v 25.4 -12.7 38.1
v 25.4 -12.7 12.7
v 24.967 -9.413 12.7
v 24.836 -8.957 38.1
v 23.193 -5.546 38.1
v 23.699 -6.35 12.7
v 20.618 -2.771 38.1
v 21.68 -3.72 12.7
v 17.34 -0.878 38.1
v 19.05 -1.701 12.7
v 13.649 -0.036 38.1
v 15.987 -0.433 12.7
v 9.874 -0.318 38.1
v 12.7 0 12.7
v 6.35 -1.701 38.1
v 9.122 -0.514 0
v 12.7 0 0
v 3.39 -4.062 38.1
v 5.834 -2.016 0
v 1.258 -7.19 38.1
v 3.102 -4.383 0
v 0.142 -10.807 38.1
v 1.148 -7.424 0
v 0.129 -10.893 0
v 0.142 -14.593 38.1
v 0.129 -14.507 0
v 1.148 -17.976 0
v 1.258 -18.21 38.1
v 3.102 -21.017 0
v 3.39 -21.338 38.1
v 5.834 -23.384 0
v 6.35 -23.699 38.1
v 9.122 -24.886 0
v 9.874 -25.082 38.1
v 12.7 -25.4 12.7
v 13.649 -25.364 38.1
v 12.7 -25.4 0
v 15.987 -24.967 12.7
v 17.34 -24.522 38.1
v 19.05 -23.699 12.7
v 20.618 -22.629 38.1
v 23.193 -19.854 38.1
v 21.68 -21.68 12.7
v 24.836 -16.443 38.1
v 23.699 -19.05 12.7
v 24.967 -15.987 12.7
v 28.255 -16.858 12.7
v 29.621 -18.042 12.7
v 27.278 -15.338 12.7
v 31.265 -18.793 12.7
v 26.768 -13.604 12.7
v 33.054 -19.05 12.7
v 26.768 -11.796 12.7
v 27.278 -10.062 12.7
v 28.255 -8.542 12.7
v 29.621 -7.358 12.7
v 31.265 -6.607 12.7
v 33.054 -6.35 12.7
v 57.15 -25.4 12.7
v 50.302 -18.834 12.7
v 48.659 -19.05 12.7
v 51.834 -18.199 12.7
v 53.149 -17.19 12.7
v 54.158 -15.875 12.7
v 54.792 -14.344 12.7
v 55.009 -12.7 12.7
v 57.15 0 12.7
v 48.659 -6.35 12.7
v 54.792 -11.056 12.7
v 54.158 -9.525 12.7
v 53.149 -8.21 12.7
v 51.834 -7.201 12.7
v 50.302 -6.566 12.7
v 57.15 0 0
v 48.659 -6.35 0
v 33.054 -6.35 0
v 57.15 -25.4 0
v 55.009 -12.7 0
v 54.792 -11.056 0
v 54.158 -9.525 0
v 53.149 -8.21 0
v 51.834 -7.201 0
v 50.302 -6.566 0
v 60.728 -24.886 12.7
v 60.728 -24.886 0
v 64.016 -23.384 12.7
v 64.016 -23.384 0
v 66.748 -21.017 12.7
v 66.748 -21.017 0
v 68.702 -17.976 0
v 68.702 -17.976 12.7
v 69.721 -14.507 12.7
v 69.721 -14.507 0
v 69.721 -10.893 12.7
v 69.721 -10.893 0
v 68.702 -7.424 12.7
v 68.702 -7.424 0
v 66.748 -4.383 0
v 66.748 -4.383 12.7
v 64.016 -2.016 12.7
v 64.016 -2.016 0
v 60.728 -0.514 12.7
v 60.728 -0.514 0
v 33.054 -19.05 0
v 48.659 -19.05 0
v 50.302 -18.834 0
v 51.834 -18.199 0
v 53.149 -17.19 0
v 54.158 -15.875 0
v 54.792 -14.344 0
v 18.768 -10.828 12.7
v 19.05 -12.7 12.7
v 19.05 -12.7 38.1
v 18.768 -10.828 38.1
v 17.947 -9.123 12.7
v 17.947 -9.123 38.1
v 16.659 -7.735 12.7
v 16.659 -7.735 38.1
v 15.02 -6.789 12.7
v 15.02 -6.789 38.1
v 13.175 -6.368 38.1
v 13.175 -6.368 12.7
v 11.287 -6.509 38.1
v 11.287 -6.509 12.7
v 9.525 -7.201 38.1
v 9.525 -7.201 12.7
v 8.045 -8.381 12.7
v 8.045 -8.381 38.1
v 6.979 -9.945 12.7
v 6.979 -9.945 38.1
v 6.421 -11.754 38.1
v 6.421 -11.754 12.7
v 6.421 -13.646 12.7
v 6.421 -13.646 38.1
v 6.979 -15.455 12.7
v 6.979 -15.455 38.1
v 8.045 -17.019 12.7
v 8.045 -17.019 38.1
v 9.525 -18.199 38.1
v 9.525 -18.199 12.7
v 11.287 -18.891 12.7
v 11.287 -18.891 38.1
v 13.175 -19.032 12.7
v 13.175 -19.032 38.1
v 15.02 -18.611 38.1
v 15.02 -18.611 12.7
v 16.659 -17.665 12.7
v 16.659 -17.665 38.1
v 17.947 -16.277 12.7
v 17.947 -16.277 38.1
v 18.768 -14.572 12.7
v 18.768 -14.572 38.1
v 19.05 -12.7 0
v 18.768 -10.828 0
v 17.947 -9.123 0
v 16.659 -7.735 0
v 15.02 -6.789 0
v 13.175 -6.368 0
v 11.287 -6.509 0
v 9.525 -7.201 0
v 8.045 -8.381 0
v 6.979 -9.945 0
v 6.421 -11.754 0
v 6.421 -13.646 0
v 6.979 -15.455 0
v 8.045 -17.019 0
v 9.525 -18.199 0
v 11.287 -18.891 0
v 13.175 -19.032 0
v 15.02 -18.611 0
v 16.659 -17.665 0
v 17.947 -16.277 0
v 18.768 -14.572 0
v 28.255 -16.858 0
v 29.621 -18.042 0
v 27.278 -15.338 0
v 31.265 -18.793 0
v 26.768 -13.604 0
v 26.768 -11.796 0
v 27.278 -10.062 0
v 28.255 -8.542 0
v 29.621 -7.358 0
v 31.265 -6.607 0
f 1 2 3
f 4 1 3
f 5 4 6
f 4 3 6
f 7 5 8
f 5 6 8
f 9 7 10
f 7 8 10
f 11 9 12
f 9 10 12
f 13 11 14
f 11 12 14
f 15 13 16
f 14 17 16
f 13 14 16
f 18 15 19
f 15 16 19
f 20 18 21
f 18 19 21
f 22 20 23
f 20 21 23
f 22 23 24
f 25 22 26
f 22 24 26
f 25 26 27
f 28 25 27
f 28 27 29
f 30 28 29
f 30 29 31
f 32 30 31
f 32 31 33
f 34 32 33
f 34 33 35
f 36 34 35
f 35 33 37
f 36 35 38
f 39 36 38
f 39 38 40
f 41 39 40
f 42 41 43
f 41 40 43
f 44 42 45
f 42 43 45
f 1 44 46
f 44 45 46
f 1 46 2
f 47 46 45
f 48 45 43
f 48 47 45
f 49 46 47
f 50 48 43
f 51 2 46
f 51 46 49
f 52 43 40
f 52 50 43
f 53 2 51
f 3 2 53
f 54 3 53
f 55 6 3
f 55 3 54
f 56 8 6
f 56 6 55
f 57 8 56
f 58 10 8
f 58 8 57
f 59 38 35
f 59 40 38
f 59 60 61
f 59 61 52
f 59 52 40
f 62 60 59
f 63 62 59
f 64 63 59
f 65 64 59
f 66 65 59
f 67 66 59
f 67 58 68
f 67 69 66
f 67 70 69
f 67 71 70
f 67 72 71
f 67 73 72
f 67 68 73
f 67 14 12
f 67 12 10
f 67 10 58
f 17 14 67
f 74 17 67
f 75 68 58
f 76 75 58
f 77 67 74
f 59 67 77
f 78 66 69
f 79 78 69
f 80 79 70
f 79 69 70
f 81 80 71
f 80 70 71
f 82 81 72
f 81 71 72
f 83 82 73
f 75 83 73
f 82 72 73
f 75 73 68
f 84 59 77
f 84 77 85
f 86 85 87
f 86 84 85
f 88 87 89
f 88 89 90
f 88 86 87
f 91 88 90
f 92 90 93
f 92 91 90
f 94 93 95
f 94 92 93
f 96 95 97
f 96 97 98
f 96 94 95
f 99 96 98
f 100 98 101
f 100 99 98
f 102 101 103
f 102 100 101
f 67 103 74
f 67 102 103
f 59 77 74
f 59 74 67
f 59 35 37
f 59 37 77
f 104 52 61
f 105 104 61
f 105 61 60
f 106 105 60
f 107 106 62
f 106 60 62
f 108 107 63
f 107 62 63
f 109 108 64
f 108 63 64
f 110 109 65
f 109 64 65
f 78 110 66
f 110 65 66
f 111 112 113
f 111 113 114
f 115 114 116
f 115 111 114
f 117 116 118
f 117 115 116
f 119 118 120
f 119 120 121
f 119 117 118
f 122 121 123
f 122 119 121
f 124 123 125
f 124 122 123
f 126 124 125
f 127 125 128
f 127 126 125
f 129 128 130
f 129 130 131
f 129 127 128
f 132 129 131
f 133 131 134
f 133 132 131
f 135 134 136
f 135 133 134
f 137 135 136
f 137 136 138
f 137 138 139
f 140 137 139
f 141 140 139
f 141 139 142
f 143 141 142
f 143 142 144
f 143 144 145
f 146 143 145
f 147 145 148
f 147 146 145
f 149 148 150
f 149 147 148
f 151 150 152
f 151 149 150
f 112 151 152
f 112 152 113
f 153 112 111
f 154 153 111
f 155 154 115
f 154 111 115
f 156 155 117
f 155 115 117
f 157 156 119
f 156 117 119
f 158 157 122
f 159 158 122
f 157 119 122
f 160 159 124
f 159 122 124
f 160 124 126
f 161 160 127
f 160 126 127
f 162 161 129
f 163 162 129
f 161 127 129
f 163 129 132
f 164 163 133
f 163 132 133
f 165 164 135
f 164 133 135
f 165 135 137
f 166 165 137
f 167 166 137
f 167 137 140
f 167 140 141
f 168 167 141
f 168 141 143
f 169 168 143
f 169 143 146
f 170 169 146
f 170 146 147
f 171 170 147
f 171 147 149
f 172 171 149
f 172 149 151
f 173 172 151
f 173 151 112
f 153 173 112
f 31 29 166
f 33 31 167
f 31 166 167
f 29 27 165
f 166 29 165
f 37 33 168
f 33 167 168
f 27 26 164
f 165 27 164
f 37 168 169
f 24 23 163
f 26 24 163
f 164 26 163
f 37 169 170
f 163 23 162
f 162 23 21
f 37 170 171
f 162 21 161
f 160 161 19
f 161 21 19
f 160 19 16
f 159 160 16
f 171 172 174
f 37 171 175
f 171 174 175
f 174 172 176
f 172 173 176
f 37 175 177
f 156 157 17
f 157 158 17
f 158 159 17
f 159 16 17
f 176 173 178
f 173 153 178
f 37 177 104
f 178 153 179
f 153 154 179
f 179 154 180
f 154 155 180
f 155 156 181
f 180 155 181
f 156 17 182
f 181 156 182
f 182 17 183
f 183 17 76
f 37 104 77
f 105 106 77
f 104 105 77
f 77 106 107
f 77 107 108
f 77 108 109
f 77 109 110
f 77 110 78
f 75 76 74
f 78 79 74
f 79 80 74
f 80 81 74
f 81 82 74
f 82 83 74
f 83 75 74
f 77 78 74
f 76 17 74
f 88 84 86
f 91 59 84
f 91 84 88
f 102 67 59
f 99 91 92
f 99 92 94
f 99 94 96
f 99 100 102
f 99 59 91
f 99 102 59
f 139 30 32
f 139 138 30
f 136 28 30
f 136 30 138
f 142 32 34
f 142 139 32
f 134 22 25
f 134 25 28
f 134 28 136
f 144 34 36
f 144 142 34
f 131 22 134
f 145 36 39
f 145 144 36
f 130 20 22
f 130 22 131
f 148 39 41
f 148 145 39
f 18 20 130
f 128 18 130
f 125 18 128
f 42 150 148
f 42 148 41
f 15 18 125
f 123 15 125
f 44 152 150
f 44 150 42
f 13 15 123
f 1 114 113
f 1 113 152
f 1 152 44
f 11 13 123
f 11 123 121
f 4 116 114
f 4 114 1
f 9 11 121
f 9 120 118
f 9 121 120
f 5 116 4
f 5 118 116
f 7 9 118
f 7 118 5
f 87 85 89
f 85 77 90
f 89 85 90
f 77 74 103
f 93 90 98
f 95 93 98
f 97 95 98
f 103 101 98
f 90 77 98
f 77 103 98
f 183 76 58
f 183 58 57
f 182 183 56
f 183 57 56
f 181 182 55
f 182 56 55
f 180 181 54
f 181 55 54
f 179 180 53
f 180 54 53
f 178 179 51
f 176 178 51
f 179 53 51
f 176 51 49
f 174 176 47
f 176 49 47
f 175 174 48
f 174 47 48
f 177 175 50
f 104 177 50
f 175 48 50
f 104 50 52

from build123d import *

# Parameters (mm, degrees)
F0_W     = 57.15
F0_H     = 12.7
F1_DEPTH = 25.4
F2_R     = 12.7
F2_R_2   = 6.35
F3_DEPTH = 25.4
F4_DEPTH = 25.4
F5_DEPTH = 25.4
F7_DEPTH = 12.7
F9_DEPTH = 25.4


with BuildPart() as f1:
    # F0 (on Front) → F1 (new body)
    with BuildSketch(Plane.XZ):
        with Locations((28.575, 6.35)):
            Rectangle(F0_W, F0_H)
    extrude(amount=F1_DEPTH)

    # F2 (on face) → F3 (join)
    with BuildSketch(Plane.XY.offset(12.7)):
        with Locations((12.7, -12.7)):
            Circle(F2_R)
        with Locations((12.7, -12.7)):
            Circle(F2_R_2, mode=Mode.SUBTRACT)
    extrude(amount=F3_DEPTH)

    # F4 (cut): faces of the model
    f4_faces = [f1.faces().sort_by_distance(p)[0] for p in [
        (2.8367728246, -22.5632271754, 12.7),
        (2.8367728246, -2.8367728246, 12.7),
    ]]
    extrude(f4_faces, amount=-F4_DEPTH, mode=Mode.SUBTRACT)

    # F5 (cut): a face of the model
    f5_faces = [f1.faces().sort_by_distance(p)[0] for p in [
        (12.7, -12.7, 12.7),
    ]]
    extrude(f5_faces, amount=-F5_DEPTH, mode=Mode.SUBTRACT)

    # F8 (on face) → F9 (cut)
    with BuildSketch(Plane.XY.offset(12.7)):
        with BuildLine():
            ThreePointArc((33.0537781119, -19.05), (37.5439061725, -17.1901280605), (39.4037781119, -12.7))
            ThreePointArc((39.4037781119, -12.7), (37.5439061725, -8.2098719395), (33.0537781119, -6.35))
            ThreePointArc((33.0537781119, -6.35), (26.7037781119, -12.7), (33.0537781119, -19.05))
        make_face()
        with BuildLine():
            ThreePointArc((33.0537781119, -6.35), (37.5439061725, -8.2098719395), (39.4037781119, -12.7))
            ThreePointArc((39.4037781119, -12.7), (37.5439061725, -17.1901280605), (33.0537781119, -19.05))
            Line((33.0537781119, -19.05), (48.6585646868, -19.05))
            ThreePointArc((48.6585646868, -19.05), (42.3085646868, -12.7), (48.6585646868, -6.35))
            Line((48.6585646868, -6.35), (33.0537781119, -6.35))
        make_face()
        with BuildLine():
            ThreePointArc((55.0085646868, -12.7), (53.1486927473, -8.2098719395), (48.6585646868, -6.35))
            ThreePointArc((48.6585646868, -6.35), (42.3085646868, -12.7), (48.6585646868, -19.05))
            ThreePointArc((48.6585646868, -19.05), (53.1486927473, -17.1901280605), (55.0085646868, -12.7))
        make_face()
    extrude(amount=-F9_DEPTH, mode=Mode.SUBTRACT)


with BuildPart() as f7:
    # F6 (on face) → F7 (new body)
    with BuildSketch(Plane.XY.offset(12.7)):
        with BuildLine():
            Line((57.15, 0), (57.15, -25.4))
            ThreePointArc((57.15, -25.4), (69.85, -12.7), (57.15, 0))
        make_face()
    extrude(amount=-F7_DEPTH)


solid = Compound([f1.part, f7.part])
